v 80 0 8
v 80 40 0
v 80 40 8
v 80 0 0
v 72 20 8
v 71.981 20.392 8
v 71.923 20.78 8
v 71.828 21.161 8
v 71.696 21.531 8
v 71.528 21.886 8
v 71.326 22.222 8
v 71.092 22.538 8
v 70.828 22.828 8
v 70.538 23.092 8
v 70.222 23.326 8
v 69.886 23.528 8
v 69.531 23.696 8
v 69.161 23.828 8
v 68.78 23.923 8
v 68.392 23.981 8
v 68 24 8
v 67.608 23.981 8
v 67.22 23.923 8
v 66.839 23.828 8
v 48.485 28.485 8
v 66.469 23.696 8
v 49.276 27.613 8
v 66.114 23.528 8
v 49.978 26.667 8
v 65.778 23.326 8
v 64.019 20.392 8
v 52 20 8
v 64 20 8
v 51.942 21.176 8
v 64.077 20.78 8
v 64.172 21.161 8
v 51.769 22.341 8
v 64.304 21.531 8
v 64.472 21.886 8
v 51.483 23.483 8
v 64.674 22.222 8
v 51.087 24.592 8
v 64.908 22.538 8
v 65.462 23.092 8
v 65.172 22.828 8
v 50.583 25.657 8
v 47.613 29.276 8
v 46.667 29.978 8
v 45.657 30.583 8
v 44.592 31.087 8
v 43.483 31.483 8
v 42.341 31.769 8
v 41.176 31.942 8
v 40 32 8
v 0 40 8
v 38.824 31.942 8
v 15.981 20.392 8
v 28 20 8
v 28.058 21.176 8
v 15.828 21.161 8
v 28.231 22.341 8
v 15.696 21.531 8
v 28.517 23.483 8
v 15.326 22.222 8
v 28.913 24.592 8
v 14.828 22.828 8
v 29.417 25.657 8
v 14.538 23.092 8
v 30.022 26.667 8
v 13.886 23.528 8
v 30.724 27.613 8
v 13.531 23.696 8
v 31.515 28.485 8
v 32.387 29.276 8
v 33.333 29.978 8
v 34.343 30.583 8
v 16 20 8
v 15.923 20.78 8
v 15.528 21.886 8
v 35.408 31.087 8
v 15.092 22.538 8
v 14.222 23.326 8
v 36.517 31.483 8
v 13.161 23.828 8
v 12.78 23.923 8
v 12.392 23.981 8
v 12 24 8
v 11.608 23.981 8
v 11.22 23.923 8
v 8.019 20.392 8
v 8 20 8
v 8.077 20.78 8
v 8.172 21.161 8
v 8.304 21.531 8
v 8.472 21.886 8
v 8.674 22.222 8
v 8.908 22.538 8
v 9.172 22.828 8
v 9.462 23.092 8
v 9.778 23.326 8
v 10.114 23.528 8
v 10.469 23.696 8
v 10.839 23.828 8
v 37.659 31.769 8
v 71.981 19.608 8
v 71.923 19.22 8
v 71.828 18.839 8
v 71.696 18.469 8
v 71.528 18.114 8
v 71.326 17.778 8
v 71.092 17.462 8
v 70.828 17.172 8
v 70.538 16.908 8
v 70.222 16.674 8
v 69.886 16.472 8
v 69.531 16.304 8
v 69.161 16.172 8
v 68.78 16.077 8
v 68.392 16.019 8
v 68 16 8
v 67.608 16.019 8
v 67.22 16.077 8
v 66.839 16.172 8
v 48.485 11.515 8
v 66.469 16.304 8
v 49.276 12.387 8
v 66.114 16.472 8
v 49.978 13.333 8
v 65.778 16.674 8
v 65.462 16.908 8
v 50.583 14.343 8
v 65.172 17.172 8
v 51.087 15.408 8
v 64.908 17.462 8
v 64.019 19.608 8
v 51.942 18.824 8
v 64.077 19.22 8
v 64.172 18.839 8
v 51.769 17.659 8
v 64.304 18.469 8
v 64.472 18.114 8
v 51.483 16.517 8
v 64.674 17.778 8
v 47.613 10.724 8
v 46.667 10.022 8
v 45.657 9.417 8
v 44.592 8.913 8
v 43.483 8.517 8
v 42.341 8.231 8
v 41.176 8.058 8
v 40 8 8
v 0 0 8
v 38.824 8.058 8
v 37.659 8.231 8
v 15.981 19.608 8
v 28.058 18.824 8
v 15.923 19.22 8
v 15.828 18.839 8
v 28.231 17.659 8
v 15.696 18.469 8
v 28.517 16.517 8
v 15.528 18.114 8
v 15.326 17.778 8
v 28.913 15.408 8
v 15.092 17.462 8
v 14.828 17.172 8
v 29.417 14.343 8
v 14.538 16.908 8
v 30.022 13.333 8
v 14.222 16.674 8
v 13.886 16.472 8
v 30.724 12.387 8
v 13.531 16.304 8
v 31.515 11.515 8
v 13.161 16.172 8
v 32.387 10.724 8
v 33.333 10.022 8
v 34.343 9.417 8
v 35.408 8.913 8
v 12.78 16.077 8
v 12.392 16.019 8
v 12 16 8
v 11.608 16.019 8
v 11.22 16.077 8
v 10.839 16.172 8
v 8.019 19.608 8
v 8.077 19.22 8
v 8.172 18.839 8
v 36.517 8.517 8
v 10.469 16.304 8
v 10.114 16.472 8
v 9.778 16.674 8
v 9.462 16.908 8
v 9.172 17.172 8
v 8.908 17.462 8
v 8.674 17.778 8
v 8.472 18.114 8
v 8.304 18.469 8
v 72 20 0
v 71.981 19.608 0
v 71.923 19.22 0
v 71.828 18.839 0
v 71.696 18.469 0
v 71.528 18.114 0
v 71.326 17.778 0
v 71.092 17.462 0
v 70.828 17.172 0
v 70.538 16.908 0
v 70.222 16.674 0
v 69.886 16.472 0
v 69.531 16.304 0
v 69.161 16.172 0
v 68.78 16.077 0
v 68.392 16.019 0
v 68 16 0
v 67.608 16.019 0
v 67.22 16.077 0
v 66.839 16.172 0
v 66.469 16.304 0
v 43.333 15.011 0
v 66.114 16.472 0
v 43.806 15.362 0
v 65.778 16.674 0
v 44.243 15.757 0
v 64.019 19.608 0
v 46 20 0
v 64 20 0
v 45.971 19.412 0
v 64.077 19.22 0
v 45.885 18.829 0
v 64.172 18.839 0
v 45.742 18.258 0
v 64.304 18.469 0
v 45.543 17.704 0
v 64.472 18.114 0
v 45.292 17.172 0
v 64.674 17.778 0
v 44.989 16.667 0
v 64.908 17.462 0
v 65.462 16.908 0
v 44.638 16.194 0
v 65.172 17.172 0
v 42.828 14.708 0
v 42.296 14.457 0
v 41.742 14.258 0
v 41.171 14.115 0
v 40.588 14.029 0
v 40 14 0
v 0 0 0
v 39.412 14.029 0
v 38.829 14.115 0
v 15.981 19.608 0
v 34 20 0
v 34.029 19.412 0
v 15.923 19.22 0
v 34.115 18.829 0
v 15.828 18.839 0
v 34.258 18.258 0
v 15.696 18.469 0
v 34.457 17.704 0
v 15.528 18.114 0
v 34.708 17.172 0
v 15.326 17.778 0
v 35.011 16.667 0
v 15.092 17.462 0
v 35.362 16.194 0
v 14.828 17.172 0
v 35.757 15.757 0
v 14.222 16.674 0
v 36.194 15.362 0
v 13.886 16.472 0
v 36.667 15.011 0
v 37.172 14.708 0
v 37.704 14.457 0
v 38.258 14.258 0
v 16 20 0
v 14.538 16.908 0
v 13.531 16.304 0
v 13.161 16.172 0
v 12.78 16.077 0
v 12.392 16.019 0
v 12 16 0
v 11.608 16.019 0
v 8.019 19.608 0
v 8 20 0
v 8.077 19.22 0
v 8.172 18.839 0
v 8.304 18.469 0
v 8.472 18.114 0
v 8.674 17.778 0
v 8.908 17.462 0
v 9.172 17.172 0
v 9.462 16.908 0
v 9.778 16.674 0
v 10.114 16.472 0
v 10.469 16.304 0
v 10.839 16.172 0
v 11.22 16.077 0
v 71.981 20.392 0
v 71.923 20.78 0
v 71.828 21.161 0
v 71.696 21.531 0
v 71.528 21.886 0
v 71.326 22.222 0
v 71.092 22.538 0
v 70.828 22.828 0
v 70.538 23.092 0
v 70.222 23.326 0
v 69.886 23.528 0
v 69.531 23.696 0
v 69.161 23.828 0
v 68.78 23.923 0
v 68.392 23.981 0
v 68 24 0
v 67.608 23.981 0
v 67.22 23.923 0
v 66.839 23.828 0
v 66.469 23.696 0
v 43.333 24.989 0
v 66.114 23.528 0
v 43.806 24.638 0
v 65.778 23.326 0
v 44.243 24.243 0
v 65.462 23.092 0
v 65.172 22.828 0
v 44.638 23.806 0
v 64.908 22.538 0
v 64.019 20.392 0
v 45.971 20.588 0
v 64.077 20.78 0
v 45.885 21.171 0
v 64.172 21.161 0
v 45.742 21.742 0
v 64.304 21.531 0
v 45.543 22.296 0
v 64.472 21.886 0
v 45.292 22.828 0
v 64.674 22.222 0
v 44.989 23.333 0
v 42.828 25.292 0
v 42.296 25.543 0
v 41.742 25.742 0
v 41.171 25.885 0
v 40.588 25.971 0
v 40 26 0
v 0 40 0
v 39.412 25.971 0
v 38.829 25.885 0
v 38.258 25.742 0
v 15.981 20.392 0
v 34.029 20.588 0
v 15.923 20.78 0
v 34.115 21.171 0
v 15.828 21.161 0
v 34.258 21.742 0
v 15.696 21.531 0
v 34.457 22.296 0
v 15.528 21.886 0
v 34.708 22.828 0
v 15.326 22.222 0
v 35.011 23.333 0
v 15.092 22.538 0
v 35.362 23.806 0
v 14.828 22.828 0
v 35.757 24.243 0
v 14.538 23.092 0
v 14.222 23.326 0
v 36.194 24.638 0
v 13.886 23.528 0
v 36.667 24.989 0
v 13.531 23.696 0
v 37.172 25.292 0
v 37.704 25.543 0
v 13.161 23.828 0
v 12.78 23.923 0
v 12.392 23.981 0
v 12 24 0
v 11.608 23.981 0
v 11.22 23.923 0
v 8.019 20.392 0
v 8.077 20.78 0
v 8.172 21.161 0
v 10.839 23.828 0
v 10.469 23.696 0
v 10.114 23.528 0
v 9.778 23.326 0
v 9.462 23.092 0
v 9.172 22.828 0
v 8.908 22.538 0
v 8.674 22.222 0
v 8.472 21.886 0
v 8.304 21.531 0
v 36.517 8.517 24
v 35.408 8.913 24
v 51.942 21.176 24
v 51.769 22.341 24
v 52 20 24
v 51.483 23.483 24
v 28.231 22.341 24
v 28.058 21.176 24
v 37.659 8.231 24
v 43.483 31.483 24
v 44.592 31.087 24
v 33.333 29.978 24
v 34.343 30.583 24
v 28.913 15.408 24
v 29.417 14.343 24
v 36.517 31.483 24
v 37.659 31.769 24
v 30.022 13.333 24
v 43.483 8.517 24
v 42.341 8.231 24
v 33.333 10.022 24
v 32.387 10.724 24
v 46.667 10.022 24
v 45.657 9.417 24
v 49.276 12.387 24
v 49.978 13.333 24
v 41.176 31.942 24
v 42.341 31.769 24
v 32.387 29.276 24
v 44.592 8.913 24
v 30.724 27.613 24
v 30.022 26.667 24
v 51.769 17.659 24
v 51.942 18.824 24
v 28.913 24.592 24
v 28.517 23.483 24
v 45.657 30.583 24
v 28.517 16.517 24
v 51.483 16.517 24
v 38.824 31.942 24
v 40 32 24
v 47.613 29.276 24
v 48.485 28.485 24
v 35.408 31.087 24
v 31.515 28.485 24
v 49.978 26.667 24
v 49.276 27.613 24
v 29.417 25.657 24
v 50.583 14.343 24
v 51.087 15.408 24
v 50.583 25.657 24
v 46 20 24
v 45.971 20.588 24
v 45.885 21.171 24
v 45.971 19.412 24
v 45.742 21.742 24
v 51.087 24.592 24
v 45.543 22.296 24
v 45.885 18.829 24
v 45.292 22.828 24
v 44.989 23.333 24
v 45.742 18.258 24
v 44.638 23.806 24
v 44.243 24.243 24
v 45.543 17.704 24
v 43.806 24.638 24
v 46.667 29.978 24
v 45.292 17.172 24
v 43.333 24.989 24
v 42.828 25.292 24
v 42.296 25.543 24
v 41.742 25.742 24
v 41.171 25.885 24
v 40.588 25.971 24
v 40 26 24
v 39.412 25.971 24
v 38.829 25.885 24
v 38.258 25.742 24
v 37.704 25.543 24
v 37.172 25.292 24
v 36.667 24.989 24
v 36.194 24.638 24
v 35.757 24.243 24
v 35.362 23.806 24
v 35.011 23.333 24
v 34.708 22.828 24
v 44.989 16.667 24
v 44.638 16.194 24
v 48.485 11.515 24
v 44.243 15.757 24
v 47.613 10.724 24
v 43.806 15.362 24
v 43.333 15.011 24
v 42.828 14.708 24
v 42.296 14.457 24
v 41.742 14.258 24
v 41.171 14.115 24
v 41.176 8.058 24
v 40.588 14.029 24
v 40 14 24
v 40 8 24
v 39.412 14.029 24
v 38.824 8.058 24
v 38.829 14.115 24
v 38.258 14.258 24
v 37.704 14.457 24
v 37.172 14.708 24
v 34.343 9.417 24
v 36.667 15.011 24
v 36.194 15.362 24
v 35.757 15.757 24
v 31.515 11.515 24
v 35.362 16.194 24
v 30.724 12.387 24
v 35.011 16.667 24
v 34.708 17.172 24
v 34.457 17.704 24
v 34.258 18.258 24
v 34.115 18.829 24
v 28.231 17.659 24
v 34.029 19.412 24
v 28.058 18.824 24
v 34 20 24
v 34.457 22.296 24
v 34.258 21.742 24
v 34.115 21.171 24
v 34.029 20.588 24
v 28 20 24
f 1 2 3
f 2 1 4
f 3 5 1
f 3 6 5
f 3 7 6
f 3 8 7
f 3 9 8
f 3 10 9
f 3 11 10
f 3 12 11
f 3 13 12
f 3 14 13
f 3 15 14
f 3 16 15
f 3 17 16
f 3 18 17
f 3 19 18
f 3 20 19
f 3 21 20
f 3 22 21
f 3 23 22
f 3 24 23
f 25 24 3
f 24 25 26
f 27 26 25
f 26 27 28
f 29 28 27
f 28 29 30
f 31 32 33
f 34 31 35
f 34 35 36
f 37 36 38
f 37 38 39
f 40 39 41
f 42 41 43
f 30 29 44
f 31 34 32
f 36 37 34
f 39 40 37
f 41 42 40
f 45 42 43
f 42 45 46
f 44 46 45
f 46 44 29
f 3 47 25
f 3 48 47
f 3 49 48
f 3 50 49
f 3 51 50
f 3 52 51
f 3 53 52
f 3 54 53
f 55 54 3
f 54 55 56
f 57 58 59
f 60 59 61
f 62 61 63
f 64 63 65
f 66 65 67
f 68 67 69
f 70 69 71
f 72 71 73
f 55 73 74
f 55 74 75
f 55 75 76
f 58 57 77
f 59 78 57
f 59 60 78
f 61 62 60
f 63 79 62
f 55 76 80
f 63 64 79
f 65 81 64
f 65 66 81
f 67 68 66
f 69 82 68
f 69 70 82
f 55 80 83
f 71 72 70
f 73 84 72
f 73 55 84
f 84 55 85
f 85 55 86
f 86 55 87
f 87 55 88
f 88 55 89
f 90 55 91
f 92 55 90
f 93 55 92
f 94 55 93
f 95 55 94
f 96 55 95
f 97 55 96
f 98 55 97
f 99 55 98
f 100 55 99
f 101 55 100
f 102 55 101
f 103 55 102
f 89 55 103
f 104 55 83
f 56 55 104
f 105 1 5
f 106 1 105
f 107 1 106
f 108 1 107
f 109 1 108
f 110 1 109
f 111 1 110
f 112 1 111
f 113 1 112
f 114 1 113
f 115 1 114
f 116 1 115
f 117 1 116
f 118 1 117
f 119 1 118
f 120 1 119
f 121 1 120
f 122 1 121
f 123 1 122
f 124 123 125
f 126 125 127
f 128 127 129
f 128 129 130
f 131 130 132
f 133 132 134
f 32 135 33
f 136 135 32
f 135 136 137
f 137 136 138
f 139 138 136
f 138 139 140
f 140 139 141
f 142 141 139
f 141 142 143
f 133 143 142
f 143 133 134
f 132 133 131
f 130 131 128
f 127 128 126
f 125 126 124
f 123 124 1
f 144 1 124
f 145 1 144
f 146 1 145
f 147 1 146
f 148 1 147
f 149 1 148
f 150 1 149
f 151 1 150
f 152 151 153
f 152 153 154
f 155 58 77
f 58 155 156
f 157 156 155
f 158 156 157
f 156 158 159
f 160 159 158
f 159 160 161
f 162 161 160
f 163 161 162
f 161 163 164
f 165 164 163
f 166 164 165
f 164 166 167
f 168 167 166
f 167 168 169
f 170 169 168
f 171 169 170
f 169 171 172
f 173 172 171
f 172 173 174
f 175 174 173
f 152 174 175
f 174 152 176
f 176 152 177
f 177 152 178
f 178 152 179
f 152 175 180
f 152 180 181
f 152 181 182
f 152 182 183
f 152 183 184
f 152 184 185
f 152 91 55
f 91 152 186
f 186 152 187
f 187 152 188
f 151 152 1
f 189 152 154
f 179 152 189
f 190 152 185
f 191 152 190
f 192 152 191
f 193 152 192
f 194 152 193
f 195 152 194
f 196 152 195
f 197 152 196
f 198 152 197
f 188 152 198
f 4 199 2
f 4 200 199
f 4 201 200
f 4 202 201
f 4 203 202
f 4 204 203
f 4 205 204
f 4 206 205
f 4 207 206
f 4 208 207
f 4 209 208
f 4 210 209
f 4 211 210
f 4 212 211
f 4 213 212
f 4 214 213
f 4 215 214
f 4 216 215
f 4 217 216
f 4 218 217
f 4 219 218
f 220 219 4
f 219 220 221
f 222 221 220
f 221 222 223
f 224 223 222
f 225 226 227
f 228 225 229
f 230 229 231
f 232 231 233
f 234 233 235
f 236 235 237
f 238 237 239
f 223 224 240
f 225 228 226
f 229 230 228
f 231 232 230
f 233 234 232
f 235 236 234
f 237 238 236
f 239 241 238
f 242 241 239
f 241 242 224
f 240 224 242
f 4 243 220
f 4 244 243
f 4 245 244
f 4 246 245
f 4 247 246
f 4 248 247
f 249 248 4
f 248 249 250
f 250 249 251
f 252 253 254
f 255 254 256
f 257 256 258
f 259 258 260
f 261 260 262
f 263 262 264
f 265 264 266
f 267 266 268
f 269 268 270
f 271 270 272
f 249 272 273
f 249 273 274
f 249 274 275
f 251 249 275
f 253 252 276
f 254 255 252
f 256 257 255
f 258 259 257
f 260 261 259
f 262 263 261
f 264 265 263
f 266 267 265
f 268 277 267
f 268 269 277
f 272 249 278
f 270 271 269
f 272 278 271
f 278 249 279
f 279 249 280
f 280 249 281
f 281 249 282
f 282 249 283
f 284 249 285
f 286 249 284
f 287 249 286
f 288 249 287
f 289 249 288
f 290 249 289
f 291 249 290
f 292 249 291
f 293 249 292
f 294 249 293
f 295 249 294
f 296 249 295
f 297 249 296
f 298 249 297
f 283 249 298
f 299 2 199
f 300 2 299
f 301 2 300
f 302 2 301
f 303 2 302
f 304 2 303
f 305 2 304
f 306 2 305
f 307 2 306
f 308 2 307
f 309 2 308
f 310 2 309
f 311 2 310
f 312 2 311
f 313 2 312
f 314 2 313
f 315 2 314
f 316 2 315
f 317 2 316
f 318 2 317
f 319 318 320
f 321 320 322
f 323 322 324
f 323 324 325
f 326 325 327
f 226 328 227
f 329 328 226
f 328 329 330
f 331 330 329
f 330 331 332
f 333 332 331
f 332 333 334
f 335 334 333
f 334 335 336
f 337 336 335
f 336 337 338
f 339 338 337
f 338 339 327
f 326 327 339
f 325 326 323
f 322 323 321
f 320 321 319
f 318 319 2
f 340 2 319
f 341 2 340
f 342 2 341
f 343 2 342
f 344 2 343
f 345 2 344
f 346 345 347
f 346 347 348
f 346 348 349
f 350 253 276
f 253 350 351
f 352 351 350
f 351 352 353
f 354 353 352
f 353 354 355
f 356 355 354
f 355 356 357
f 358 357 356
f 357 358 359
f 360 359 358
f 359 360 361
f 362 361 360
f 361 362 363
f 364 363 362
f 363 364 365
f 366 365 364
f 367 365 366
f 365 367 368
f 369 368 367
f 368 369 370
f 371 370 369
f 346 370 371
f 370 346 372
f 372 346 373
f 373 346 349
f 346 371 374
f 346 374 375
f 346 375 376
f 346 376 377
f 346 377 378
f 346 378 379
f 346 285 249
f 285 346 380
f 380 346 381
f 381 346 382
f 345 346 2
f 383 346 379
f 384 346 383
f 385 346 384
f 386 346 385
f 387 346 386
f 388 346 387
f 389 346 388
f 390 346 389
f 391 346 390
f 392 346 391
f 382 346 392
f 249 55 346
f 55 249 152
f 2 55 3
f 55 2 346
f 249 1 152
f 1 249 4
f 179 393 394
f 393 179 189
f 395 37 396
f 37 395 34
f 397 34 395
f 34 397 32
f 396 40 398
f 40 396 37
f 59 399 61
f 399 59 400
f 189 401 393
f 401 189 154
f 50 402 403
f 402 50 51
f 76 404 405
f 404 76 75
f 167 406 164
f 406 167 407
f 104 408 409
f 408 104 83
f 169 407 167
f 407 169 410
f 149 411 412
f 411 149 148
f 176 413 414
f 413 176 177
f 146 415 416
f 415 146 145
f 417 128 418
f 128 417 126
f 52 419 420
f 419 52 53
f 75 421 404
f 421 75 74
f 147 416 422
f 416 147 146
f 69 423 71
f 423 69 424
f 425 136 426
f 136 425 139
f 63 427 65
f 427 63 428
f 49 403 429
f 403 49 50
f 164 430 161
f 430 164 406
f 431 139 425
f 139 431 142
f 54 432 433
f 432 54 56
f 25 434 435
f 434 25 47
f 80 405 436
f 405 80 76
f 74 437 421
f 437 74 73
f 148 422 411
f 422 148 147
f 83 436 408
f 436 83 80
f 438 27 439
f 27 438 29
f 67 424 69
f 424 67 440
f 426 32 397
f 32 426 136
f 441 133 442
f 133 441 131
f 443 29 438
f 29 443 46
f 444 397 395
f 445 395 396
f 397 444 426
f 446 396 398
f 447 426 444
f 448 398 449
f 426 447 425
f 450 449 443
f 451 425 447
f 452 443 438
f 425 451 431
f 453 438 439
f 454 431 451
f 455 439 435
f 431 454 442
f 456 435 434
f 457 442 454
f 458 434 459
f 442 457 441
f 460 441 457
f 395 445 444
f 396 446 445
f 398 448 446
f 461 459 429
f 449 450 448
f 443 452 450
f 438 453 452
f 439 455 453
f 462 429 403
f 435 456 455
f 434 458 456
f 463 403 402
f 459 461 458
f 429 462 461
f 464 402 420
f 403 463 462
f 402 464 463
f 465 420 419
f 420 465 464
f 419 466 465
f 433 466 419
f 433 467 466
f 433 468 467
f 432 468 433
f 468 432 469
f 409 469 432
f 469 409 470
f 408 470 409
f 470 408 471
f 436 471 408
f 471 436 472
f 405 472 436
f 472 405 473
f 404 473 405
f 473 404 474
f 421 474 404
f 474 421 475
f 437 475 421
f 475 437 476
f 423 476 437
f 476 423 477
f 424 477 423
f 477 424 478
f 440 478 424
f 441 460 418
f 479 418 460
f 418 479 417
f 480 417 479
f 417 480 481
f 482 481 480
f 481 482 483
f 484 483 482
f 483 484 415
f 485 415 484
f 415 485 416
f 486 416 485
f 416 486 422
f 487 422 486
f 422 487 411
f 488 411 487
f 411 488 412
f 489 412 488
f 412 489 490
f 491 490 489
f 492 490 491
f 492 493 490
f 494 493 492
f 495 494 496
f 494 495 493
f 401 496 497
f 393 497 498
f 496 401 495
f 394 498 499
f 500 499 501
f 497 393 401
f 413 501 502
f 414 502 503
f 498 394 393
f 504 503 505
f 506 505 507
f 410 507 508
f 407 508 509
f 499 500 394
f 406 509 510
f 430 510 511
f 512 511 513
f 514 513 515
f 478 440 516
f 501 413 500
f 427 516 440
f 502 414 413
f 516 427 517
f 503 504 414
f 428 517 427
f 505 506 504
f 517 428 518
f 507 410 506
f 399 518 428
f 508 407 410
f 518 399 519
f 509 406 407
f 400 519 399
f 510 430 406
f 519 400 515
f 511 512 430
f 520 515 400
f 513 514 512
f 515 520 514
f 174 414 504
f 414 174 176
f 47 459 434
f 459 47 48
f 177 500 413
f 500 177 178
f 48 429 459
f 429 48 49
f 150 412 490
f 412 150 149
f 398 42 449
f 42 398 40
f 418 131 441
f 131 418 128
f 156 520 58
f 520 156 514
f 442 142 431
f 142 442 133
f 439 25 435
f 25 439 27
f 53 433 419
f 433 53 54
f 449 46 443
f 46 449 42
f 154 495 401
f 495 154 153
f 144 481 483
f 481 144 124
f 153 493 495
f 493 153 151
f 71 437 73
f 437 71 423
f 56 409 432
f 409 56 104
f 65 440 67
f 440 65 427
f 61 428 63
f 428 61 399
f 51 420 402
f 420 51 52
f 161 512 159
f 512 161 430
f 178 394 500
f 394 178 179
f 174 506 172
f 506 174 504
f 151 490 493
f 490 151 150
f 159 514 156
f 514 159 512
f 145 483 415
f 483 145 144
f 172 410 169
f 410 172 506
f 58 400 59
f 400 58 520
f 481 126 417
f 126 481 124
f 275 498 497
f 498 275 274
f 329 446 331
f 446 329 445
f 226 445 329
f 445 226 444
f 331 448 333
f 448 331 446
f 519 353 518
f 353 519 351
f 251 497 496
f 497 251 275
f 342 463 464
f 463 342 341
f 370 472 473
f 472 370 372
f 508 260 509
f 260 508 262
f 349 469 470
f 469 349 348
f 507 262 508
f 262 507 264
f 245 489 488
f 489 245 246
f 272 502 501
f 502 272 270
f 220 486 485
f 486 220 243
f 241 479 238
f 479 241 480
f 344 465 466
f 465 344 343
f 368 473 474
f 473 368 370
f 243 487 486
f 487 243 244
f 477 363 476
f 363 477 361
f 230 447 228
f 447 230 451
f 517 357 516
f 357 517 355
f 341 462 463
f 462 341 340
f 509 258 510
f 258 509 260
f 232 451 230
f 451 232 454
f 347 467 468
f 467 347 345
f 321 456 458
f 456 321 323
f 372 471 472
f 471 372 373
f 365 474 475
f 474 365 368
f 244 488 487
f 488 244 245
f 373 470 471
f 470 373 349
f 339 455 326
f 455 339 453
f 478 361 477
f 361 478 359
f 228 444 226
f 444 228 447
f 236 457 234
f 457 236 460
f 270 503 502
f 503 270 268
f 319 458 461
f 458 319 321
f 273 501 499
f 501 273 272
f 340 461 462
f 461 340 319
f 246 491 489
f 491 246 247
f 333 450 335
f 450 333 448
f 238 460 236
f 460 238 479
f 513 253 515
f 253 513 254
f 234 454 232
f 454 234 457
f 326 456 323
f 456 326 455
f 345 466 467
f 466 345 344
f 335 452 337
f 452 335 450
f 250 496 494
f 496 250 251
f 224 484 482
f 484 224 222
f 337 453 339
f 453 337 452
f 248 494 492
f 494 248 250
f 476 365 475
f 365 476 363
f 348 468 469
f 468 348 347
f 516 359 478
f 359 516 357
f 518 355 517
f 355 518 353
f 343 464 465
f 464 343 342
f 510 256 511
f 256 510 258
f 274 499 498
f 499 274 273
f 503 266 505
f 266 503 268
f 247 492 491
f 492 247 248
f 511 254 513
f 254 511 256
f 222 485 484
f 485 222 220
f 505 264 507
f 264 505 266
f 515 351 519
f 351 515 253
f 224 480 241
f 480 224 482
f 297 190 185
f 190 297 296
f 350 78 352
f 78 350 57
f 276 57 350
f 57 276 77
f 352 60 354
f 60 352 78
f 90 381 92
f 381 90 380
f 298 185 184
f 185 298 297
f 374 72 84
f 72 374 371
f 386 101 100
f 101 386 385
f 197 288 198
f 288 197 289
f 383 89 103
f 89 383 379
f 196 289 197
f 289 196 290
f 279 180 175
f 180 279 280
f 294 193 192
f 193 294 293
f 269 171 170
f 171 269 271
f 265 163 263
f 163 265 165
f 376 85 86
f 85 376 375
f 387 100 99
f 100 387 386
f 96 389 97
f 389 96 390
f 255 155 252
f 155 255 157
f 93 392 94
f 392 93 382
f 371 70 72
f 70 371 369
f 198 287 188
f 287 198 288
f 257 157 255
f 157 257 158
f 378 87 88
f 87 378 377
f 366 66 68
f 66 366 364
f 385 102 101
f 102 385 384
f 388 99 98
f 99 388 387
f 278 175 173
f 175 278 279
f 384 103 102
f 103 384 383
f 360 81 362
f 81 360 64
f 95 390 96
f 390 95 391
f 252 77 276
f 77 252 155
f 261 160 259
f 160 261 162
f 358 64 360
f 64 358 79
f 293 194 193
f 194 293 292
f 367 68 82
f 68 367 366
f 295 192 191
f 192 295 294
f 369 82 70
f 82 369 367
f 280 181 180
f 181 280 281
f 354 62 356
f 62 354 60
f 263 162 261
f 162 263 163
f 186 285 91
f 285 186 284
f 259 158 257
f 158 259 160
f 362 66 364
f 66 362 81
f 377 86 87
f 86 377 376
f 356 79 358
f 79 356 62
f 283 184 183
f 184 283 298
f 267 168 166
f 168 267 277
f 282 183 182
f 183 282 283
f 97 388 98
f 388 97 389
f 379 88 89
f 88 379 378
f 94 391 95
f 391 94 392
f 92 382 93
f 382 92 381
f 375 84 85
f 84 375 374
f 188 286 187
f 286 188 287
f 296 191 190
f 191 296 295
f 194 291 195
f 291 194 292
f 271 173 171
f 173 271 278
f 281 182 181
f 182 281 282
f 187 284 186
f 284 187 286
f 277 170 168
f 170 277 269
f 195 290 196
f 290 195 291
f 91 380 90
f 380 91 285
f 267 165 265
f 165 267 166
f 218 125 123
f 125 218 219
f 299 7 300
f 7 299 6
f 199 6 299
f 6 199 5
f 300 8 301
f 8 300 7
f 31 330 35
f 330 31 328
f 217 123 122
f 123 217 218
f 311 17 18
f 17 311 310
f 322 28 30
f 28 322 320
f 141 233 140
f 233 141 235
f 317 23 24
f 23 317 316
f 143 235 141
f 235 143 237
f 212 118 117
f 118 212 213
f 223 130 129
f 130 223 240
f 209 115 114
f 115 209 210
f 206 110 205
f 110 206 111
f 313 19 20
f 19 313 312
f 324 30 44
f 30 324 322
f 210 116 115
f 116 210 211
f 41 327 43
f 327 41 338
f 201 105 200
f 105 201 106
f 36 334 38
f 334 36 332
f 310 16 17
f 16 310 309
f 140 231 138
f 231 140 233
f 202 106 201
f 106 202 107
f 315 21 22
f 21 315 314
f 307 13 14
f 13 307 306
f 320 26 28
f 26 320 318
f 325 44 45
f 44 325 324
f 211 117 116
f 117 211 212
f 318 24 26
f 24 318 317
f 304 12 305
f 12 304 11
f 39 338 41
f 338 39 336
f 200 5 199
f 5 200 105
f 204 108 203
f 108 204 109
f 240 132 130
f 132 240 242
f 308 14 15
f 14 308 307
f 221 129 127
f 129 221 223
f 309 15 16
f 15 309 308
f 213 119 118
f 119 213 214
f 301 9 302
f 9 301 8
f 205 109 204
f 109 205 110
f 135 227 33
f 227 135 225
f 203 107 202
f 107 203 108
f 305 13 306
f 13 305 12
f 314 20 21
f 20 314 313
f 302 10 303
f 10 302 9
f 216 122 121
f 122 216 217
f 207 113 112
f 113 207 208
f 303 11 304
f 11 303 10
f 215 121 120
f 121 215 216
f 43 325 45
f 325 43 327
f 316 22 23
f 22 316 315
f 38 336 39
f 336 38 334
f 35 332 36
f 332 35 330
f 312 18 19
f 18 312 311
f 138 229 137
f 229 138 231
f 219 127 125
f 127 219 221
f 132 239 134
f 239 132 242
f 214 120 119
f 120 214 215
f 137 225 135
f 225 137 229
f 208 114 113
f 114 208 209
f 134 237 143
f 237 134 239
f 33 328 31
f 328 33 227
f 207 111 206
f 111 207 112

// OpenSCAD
// bracket: generated by ShapeBridge (https://github.com/gazi-faysal-jubayer/shapebridge)
// Units: mm. Edit the parameters below; geometry updates from them.

$fn = 64;

width = 80; // overall length
depth = 40;
thickness = 8;
boss_r = 12;
boss_h = thickness * 2;
hole_r = boss_r / 2;

difference() {
  difference() {
    difference() {
      union() {
        translate([0, 0, 0]) cube([width, depth, thickness]);
        translate([width / 2, depth / 2, thickness]) cylinder(r = boss_r, h = boss_h);
      }
      translate([width / 2, depth / 2, 0]) cylinder(r = hole_r, h = thickness + boss_h);
    }
    translate([thickness * 1.5, depth / 2, 0]) cylinder(r = thickness / 2, h = thickness);
  }
  translate([width - thickness * 1.5, depth / 2, 0]) cylinder(r = thickness / 2, h = thickness);
}
